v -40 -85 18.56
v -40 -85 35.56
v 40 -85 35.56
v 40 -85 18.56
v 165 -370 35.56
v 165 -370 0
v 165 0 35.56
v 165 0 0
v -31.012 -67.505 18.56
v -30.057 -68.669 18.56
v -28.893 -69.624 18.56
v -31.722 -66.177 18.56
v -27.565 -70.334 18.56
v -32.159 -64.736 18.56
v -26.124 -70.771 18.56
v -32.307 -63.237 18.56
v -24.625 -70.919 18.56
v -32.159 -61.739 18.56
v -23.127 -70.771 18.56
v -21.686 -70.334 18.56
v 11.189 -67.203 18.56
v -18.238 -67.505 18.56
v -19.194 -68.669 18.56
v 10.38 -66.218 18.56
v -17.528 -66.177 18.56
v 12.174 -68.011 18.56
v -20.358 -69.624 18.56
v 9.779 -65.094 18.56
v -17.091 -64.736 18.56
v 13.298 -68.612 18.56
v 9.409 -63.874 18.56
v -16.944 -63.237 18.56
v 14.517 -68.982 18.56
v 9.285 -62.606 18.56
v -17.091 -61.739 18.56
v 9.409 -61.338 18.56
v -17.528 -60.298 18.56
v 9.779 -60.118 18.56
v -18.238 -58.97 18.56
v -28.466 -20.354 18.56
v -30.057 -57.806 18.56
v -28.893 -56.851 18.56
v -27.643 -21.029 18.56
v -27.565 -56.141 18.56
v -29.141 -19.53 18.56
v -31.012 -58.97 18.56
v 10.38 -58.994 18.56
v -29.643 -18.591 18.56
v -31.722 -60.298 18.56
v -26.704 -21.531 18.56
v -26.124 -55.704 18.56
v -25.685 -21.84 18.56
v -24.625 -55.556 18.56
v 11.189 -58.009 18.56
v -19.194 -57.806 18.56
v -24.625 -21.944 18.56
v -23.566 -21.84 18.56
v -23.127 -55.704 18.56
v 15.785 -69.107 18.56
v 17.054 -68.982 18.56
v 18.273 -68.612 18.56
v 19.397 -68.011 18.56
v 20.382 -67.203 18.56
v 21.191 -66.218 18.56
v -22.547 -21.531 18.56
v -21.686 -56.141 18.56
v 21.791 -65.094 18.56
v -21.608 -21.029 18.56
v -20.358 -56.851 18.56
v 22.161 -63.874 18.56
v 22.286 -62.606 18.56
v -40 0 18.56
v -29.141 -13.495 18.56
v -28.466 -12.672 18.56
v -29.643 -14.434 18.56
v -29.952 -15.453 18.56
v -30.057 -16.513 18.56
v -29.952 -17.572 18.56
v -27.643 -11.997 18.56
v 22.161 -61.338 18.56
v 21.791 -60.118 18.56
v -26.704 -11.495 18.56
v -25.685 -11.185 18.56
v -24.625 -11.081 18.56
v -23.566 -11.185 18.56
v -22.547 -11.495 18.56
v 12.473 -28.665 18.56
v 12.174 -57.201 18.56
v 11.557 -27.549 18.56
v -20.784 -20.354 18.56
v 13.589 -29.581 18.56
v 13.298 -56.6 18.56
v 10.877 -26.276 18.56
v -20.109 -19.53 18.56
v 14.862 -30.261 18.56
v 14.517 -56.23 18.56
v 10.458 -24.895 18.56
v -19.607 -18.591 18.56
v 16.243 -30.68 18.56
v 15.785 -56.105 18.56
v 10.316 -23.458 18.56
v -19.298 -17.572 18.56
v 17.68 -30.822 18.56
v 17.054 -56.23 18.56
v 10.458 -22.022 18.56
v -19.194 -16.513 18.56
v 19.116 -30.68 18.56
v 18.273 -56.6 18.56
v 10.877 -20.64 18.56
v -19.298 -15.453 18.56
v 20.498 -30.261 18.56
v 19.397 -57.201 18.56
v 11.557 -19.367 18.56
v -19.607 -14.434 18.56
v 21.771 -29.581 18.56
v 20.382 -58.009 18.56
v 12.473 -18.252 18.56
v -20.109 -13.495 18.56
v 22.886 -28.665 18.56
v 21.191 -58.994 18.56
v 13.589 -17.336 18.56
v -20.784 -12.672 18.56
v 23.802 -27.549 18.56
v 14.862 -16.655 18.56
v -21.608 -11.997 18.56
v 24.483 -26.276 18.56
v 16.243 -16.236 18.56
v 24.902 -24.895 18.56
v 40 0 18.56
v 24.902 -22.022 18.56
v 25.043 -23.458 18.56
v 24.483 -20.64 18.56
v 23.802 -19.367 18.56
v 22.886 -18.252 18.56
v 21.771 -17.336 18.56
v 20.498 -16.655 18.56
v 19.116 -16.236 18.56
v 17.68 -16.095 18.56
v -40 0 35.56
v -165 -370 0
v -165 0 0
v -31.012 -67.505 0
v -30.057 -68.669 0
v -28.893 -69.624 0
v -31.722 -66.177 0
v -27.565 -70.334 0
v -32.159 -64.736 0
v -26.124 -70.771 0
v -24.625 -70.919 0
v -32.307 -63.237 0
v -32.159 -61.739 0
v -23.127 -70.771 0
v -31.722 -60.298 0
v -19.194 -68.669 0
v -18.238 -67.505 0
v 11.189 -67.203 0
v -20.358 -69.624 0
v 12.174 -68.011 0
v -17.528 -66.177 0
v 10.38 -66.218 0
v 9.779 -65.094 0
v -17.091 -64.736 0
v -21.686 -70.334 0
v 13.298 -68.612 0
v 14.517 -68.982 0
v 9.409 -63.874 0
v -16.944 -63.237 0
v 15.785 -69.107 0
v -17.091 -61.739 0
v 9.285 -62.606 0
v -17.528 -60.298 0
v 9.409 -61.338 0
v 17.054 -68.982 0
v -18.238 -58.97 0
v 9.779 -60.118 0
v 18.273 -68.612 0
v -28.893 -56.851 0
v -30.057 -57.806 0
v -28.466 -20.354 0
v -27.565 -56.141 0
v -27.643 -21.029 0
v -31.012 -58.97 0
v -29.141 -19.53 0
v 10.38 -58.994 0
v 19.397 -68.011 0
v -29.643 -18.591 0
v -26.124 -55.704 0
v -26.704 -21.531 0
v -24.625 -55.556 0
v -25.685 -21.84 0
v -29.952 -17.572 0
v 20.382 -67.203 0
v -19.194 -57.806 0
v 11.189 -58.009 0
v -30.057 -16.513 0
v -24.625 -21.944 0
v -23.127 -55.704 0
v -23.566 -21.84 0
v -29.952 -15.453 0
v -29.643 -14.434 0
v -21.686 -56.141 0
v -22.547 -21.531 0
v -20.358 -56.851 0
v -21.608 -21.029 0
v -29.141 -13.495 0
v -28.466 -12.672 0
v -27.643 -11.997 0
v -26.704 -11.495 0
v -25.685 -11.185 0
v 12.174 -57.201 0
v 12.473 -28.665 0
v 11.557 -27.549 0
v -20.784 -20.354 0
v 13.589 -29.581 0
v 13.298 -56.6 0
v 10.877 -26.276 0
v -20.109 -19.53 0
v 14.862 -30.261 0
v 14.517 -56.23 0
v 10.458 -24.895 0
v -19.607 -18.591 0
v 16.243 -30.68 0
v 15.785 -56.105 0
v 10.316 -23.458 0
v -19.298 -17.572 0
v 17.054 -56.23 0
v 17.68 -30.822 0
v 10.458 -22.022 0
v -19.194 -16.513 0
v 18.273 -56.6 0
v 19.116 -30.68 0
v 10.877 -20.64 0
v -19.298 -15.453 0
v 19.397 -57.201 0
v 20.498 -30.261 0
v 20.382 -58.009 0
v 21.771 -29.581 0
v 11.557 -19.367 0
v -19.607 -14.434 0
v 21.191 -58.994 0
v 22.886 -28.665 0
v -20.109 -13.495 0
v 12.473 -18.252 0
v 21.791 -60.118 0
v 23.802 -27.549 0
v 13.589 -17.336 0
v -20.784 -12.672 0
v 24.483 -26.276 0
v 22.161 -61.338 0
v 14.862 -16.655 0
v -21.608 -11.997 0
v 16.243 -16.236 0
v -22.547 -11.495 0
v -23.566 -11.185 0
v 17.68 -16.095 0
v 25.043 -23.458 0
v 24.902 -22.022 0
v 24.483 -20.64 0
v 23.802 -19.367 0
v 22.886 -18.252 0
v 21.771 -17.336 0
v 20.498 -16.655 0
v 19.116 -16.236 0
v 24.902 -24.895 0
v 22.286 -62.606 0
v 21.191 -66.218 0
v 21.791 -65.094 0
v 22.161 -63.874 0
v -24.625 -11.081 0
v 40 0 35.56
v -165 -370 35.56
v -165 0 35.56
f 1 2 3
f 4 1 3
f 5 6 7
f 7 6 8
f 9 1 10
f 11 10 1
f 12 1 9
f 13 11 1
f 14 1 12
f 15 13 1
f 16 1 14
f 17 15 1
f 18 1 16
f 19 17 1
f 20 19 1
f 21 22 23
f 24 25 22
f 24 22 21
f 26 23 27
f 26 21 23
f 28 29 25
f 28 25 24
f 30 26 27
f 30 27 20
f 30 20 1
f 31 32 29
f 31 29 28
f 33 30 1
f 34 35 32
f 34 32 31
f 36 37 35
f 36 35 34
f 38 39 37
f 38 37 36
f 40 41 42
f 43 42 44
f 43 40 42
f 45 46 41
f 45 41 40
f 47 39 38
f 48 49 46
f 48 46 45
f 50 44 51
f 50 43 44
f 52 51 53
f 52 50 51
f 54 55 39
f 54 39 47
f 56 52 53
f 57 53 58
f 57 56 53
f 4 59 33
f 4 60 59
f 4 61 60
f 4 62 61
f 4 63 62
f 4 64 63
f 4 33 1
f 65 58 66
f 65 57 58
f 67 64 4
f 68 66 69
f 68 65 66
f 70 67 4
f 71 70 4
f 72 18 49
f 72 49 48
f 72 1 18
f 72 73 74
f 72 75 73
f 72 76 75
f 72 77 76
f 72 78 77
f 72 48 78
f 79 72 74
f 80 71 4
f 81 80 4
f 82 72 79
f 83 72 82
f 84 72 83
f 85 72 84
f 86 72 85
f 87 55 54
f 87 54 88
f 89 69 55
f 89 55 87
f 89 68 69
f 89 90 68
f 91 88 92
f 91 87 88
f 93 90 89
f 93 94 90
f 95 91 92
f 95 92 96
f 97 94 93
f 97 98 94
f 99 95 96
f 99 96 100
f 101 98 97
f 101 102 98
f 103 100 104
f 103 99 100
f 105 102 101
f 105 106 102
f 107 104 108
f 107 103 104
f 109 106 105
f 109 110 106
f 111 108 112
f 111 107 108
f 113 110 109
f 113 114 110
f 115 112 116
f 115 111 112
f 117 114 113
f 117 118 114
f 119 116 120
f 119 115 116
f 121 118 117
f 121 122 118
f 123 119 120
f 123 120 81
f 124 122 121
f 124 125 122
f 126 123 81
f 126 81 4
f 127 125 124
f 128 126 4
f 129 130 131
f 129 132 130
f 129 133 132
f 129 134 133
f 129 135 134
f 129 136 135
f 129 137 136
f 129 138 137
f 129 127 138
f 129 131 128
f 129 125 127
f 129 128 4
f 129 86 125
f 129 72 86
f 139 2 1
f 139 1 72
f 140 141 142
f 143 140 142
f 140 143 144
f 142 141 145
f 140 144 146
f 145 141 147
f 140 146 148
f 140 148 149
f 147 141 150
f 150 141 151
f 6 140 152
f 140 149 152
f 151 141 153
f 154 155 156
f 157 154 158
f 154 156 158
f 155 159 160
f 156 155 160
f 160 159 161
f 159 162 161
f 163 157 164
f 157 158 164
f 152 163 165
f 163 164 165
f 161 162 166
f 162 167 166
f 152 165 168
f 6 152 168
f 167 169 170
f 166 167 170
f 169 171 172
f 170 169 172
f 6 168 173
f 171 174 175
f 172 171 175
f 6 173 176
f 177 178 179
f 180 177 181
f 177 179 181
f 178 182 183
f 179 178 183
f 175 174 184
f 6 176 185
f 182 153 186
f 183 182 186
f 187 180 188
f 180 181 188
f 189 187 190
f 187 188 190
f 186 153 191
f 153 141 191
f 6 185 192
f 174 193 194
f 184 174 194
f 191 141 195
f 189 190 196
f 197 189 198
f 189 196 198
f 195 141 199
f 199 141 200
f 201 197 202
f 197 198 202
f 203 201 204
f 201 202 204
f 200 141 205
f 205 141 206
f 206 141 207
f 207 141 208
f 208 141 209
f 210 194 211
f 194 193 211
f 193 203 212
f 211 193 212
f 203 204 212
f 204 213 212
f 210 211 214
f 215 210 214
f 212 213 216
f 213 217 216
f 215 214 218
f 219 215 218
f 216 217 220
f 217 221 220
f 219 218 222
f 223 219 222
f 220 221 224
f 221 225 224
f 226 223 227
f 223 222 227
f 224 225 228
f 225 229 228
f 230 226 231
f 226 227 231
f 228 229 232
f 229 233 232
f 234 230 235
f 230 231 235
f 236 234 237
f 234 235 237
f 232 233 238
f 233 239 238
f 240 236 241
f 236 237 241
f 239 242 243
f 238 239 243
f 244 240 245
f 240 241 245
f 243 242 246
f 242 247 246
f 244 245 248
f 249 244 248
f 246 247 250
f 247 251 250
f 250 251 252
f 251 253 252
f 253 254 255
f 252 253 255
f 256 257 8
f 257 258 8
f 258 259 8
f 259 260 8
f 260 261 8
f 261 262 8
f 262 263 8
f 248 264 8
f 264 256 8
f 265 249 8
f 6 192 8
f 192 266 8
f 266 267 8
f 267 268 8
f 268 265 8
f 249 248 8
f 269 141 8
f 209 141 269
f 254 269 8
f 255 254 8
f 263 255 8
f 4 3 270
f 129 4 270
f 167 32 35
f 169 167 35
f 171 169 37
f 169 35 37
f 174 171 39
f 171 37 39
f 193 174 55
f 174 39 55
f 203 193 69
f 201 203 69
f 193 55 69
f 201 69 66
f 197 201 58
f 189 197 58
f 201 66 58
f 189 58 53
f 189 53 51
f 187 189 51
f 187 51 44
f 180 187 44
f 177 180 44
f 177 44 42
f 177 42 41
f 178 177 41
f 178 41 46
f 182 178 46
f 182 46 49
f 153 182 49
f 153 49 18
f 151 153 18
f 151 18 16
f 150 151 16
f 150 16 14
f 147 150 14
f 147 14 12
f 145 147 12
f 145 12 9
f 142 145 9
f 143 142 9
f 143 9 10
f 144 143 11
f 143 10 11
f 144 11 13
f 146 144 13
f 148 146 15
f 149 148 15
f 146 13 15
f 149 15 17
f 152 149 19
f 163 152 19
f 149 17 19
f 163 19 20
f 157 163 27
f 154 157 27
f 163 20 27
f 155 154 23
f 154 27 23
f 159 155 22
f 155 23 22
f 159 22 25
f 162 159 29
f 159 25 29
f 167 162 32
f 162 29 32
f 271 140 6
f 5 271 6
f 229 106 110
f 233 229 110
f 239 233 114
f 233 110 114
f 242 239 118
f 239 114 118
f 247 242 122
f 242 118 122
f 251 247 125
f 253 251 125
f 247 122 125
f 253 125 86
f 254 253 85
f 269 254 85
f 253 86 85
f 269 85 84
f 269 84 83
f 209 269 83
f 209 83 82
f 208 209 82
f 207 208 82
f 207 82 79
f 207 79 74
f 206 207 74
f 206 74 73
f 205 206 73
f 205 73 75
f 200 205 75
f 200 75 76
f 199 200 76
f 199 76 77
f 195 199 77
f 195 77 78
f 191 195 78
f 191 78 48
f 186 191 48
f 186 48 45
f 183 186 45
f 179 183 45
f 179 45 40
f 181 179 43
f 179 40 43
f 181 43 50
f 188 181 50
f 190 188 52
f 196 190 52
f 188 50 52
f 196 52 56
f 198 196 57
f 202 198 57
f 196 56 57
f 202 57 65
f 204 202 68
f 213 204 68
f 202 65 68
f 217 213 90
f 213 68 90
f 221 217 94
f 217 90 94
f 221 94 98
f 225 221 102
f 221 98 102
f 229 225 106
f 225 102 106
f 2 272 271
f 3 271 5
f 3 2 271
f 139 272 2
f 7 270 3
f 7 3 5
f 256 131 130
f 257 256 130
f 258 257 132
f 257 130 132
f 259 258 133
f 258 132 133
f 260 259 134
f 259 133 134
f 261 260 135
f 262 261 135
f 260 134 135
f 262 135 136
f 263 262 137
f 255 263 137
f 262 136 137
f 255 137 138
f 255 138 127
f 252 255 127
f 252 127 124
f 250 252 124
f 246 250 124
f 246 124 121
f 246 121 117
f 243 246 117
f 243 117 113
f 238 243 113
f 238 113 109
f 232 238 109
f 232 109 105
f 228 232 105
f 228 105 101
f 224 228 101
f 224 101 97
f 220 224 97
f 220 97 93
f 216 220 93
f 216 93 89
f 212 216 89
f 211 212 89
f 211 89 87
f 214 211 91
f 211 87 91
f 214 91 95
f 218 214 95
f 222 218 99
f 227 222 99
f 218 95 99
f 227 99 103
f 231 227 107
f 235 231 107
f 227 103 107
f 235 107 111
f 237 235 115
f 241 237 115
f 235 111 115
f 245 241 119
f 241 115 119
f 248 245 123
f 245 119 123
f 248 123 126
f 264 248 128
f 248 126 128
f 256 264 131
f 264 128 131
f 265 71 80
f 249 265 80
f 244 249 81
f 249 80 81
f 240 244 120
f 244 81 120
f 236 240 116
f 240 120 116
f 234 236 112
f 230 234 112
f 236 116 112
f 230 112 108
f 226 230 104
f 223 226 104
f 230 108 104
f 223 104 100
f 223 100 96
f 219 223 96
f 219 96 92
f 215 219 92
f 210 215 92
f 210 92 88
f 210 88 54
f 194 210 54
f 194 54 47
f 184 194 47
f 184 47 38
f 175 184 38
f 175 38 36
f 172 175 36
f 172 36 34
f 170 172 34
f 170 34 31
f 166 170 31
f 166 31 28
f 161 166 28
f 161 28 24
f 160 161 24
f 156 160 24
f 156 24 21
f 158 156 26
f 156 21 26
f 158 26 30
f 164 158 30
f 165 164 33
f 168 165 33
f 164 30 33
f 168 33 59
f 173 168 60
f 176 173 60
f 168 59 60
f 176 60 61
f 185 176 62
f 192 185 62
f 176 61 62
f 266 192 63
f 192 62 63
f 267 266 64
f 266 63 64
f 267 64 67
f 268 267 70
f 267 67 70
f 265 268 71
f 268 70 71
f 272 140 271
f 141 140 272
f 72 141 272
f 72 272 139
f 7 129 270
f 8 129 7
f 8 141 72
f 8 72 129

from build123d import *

# Parameters (mm, degrees)
F0_W     = 330
F0_H     = 370
F1_DEPTH = 35.56
F2_W     = 80
F2_H     = 85
F3_DEPTH = 17
F4_R     = 5.431647
F4_R_2   = 7.363502
F4_R_3   = 7.681498
F4_R_4   = 6.500814
F5_DEPTH = 18.561


with BuildPart() as f1:
    # F0 (on Top) → F1 (new body)
    with BuildSketch(Plane.XY):
        with Locations((0, -185)):
            Rectangle(F0_W, F0_H)
    extrude(amount=F1_DEPTH)

    # F2 (on face) → F3 (cut)
    with BuildSketch(Plane.XY.offset(35.56)):
        with Locations((0, -42.5)):
            Rectangle(F2_W, F2_H)
    extrude(amount=-F3_DEPTH, mode=Mode.SUBTRACT)

    # F4 (on face) → F5 (cut, through all)
    with BuildSketch(Plane.XY.offset(18.56)):
        with Locations((-24.62519, -16.512778)):
            Circle(F4_R)
        with Locations((17.679622, -23.458349)):
            Circle(F4_R_2)
        with Locations((-24.62519, -63.237496)):
            Circle(F4_R_3)
        with Locations((15.785381, -62.606081)):
            Circle(F4_R_4)
    extrude(amount=-F5_DEPTH, mode=Mode.SUBTRACT)


solid = f1.part
